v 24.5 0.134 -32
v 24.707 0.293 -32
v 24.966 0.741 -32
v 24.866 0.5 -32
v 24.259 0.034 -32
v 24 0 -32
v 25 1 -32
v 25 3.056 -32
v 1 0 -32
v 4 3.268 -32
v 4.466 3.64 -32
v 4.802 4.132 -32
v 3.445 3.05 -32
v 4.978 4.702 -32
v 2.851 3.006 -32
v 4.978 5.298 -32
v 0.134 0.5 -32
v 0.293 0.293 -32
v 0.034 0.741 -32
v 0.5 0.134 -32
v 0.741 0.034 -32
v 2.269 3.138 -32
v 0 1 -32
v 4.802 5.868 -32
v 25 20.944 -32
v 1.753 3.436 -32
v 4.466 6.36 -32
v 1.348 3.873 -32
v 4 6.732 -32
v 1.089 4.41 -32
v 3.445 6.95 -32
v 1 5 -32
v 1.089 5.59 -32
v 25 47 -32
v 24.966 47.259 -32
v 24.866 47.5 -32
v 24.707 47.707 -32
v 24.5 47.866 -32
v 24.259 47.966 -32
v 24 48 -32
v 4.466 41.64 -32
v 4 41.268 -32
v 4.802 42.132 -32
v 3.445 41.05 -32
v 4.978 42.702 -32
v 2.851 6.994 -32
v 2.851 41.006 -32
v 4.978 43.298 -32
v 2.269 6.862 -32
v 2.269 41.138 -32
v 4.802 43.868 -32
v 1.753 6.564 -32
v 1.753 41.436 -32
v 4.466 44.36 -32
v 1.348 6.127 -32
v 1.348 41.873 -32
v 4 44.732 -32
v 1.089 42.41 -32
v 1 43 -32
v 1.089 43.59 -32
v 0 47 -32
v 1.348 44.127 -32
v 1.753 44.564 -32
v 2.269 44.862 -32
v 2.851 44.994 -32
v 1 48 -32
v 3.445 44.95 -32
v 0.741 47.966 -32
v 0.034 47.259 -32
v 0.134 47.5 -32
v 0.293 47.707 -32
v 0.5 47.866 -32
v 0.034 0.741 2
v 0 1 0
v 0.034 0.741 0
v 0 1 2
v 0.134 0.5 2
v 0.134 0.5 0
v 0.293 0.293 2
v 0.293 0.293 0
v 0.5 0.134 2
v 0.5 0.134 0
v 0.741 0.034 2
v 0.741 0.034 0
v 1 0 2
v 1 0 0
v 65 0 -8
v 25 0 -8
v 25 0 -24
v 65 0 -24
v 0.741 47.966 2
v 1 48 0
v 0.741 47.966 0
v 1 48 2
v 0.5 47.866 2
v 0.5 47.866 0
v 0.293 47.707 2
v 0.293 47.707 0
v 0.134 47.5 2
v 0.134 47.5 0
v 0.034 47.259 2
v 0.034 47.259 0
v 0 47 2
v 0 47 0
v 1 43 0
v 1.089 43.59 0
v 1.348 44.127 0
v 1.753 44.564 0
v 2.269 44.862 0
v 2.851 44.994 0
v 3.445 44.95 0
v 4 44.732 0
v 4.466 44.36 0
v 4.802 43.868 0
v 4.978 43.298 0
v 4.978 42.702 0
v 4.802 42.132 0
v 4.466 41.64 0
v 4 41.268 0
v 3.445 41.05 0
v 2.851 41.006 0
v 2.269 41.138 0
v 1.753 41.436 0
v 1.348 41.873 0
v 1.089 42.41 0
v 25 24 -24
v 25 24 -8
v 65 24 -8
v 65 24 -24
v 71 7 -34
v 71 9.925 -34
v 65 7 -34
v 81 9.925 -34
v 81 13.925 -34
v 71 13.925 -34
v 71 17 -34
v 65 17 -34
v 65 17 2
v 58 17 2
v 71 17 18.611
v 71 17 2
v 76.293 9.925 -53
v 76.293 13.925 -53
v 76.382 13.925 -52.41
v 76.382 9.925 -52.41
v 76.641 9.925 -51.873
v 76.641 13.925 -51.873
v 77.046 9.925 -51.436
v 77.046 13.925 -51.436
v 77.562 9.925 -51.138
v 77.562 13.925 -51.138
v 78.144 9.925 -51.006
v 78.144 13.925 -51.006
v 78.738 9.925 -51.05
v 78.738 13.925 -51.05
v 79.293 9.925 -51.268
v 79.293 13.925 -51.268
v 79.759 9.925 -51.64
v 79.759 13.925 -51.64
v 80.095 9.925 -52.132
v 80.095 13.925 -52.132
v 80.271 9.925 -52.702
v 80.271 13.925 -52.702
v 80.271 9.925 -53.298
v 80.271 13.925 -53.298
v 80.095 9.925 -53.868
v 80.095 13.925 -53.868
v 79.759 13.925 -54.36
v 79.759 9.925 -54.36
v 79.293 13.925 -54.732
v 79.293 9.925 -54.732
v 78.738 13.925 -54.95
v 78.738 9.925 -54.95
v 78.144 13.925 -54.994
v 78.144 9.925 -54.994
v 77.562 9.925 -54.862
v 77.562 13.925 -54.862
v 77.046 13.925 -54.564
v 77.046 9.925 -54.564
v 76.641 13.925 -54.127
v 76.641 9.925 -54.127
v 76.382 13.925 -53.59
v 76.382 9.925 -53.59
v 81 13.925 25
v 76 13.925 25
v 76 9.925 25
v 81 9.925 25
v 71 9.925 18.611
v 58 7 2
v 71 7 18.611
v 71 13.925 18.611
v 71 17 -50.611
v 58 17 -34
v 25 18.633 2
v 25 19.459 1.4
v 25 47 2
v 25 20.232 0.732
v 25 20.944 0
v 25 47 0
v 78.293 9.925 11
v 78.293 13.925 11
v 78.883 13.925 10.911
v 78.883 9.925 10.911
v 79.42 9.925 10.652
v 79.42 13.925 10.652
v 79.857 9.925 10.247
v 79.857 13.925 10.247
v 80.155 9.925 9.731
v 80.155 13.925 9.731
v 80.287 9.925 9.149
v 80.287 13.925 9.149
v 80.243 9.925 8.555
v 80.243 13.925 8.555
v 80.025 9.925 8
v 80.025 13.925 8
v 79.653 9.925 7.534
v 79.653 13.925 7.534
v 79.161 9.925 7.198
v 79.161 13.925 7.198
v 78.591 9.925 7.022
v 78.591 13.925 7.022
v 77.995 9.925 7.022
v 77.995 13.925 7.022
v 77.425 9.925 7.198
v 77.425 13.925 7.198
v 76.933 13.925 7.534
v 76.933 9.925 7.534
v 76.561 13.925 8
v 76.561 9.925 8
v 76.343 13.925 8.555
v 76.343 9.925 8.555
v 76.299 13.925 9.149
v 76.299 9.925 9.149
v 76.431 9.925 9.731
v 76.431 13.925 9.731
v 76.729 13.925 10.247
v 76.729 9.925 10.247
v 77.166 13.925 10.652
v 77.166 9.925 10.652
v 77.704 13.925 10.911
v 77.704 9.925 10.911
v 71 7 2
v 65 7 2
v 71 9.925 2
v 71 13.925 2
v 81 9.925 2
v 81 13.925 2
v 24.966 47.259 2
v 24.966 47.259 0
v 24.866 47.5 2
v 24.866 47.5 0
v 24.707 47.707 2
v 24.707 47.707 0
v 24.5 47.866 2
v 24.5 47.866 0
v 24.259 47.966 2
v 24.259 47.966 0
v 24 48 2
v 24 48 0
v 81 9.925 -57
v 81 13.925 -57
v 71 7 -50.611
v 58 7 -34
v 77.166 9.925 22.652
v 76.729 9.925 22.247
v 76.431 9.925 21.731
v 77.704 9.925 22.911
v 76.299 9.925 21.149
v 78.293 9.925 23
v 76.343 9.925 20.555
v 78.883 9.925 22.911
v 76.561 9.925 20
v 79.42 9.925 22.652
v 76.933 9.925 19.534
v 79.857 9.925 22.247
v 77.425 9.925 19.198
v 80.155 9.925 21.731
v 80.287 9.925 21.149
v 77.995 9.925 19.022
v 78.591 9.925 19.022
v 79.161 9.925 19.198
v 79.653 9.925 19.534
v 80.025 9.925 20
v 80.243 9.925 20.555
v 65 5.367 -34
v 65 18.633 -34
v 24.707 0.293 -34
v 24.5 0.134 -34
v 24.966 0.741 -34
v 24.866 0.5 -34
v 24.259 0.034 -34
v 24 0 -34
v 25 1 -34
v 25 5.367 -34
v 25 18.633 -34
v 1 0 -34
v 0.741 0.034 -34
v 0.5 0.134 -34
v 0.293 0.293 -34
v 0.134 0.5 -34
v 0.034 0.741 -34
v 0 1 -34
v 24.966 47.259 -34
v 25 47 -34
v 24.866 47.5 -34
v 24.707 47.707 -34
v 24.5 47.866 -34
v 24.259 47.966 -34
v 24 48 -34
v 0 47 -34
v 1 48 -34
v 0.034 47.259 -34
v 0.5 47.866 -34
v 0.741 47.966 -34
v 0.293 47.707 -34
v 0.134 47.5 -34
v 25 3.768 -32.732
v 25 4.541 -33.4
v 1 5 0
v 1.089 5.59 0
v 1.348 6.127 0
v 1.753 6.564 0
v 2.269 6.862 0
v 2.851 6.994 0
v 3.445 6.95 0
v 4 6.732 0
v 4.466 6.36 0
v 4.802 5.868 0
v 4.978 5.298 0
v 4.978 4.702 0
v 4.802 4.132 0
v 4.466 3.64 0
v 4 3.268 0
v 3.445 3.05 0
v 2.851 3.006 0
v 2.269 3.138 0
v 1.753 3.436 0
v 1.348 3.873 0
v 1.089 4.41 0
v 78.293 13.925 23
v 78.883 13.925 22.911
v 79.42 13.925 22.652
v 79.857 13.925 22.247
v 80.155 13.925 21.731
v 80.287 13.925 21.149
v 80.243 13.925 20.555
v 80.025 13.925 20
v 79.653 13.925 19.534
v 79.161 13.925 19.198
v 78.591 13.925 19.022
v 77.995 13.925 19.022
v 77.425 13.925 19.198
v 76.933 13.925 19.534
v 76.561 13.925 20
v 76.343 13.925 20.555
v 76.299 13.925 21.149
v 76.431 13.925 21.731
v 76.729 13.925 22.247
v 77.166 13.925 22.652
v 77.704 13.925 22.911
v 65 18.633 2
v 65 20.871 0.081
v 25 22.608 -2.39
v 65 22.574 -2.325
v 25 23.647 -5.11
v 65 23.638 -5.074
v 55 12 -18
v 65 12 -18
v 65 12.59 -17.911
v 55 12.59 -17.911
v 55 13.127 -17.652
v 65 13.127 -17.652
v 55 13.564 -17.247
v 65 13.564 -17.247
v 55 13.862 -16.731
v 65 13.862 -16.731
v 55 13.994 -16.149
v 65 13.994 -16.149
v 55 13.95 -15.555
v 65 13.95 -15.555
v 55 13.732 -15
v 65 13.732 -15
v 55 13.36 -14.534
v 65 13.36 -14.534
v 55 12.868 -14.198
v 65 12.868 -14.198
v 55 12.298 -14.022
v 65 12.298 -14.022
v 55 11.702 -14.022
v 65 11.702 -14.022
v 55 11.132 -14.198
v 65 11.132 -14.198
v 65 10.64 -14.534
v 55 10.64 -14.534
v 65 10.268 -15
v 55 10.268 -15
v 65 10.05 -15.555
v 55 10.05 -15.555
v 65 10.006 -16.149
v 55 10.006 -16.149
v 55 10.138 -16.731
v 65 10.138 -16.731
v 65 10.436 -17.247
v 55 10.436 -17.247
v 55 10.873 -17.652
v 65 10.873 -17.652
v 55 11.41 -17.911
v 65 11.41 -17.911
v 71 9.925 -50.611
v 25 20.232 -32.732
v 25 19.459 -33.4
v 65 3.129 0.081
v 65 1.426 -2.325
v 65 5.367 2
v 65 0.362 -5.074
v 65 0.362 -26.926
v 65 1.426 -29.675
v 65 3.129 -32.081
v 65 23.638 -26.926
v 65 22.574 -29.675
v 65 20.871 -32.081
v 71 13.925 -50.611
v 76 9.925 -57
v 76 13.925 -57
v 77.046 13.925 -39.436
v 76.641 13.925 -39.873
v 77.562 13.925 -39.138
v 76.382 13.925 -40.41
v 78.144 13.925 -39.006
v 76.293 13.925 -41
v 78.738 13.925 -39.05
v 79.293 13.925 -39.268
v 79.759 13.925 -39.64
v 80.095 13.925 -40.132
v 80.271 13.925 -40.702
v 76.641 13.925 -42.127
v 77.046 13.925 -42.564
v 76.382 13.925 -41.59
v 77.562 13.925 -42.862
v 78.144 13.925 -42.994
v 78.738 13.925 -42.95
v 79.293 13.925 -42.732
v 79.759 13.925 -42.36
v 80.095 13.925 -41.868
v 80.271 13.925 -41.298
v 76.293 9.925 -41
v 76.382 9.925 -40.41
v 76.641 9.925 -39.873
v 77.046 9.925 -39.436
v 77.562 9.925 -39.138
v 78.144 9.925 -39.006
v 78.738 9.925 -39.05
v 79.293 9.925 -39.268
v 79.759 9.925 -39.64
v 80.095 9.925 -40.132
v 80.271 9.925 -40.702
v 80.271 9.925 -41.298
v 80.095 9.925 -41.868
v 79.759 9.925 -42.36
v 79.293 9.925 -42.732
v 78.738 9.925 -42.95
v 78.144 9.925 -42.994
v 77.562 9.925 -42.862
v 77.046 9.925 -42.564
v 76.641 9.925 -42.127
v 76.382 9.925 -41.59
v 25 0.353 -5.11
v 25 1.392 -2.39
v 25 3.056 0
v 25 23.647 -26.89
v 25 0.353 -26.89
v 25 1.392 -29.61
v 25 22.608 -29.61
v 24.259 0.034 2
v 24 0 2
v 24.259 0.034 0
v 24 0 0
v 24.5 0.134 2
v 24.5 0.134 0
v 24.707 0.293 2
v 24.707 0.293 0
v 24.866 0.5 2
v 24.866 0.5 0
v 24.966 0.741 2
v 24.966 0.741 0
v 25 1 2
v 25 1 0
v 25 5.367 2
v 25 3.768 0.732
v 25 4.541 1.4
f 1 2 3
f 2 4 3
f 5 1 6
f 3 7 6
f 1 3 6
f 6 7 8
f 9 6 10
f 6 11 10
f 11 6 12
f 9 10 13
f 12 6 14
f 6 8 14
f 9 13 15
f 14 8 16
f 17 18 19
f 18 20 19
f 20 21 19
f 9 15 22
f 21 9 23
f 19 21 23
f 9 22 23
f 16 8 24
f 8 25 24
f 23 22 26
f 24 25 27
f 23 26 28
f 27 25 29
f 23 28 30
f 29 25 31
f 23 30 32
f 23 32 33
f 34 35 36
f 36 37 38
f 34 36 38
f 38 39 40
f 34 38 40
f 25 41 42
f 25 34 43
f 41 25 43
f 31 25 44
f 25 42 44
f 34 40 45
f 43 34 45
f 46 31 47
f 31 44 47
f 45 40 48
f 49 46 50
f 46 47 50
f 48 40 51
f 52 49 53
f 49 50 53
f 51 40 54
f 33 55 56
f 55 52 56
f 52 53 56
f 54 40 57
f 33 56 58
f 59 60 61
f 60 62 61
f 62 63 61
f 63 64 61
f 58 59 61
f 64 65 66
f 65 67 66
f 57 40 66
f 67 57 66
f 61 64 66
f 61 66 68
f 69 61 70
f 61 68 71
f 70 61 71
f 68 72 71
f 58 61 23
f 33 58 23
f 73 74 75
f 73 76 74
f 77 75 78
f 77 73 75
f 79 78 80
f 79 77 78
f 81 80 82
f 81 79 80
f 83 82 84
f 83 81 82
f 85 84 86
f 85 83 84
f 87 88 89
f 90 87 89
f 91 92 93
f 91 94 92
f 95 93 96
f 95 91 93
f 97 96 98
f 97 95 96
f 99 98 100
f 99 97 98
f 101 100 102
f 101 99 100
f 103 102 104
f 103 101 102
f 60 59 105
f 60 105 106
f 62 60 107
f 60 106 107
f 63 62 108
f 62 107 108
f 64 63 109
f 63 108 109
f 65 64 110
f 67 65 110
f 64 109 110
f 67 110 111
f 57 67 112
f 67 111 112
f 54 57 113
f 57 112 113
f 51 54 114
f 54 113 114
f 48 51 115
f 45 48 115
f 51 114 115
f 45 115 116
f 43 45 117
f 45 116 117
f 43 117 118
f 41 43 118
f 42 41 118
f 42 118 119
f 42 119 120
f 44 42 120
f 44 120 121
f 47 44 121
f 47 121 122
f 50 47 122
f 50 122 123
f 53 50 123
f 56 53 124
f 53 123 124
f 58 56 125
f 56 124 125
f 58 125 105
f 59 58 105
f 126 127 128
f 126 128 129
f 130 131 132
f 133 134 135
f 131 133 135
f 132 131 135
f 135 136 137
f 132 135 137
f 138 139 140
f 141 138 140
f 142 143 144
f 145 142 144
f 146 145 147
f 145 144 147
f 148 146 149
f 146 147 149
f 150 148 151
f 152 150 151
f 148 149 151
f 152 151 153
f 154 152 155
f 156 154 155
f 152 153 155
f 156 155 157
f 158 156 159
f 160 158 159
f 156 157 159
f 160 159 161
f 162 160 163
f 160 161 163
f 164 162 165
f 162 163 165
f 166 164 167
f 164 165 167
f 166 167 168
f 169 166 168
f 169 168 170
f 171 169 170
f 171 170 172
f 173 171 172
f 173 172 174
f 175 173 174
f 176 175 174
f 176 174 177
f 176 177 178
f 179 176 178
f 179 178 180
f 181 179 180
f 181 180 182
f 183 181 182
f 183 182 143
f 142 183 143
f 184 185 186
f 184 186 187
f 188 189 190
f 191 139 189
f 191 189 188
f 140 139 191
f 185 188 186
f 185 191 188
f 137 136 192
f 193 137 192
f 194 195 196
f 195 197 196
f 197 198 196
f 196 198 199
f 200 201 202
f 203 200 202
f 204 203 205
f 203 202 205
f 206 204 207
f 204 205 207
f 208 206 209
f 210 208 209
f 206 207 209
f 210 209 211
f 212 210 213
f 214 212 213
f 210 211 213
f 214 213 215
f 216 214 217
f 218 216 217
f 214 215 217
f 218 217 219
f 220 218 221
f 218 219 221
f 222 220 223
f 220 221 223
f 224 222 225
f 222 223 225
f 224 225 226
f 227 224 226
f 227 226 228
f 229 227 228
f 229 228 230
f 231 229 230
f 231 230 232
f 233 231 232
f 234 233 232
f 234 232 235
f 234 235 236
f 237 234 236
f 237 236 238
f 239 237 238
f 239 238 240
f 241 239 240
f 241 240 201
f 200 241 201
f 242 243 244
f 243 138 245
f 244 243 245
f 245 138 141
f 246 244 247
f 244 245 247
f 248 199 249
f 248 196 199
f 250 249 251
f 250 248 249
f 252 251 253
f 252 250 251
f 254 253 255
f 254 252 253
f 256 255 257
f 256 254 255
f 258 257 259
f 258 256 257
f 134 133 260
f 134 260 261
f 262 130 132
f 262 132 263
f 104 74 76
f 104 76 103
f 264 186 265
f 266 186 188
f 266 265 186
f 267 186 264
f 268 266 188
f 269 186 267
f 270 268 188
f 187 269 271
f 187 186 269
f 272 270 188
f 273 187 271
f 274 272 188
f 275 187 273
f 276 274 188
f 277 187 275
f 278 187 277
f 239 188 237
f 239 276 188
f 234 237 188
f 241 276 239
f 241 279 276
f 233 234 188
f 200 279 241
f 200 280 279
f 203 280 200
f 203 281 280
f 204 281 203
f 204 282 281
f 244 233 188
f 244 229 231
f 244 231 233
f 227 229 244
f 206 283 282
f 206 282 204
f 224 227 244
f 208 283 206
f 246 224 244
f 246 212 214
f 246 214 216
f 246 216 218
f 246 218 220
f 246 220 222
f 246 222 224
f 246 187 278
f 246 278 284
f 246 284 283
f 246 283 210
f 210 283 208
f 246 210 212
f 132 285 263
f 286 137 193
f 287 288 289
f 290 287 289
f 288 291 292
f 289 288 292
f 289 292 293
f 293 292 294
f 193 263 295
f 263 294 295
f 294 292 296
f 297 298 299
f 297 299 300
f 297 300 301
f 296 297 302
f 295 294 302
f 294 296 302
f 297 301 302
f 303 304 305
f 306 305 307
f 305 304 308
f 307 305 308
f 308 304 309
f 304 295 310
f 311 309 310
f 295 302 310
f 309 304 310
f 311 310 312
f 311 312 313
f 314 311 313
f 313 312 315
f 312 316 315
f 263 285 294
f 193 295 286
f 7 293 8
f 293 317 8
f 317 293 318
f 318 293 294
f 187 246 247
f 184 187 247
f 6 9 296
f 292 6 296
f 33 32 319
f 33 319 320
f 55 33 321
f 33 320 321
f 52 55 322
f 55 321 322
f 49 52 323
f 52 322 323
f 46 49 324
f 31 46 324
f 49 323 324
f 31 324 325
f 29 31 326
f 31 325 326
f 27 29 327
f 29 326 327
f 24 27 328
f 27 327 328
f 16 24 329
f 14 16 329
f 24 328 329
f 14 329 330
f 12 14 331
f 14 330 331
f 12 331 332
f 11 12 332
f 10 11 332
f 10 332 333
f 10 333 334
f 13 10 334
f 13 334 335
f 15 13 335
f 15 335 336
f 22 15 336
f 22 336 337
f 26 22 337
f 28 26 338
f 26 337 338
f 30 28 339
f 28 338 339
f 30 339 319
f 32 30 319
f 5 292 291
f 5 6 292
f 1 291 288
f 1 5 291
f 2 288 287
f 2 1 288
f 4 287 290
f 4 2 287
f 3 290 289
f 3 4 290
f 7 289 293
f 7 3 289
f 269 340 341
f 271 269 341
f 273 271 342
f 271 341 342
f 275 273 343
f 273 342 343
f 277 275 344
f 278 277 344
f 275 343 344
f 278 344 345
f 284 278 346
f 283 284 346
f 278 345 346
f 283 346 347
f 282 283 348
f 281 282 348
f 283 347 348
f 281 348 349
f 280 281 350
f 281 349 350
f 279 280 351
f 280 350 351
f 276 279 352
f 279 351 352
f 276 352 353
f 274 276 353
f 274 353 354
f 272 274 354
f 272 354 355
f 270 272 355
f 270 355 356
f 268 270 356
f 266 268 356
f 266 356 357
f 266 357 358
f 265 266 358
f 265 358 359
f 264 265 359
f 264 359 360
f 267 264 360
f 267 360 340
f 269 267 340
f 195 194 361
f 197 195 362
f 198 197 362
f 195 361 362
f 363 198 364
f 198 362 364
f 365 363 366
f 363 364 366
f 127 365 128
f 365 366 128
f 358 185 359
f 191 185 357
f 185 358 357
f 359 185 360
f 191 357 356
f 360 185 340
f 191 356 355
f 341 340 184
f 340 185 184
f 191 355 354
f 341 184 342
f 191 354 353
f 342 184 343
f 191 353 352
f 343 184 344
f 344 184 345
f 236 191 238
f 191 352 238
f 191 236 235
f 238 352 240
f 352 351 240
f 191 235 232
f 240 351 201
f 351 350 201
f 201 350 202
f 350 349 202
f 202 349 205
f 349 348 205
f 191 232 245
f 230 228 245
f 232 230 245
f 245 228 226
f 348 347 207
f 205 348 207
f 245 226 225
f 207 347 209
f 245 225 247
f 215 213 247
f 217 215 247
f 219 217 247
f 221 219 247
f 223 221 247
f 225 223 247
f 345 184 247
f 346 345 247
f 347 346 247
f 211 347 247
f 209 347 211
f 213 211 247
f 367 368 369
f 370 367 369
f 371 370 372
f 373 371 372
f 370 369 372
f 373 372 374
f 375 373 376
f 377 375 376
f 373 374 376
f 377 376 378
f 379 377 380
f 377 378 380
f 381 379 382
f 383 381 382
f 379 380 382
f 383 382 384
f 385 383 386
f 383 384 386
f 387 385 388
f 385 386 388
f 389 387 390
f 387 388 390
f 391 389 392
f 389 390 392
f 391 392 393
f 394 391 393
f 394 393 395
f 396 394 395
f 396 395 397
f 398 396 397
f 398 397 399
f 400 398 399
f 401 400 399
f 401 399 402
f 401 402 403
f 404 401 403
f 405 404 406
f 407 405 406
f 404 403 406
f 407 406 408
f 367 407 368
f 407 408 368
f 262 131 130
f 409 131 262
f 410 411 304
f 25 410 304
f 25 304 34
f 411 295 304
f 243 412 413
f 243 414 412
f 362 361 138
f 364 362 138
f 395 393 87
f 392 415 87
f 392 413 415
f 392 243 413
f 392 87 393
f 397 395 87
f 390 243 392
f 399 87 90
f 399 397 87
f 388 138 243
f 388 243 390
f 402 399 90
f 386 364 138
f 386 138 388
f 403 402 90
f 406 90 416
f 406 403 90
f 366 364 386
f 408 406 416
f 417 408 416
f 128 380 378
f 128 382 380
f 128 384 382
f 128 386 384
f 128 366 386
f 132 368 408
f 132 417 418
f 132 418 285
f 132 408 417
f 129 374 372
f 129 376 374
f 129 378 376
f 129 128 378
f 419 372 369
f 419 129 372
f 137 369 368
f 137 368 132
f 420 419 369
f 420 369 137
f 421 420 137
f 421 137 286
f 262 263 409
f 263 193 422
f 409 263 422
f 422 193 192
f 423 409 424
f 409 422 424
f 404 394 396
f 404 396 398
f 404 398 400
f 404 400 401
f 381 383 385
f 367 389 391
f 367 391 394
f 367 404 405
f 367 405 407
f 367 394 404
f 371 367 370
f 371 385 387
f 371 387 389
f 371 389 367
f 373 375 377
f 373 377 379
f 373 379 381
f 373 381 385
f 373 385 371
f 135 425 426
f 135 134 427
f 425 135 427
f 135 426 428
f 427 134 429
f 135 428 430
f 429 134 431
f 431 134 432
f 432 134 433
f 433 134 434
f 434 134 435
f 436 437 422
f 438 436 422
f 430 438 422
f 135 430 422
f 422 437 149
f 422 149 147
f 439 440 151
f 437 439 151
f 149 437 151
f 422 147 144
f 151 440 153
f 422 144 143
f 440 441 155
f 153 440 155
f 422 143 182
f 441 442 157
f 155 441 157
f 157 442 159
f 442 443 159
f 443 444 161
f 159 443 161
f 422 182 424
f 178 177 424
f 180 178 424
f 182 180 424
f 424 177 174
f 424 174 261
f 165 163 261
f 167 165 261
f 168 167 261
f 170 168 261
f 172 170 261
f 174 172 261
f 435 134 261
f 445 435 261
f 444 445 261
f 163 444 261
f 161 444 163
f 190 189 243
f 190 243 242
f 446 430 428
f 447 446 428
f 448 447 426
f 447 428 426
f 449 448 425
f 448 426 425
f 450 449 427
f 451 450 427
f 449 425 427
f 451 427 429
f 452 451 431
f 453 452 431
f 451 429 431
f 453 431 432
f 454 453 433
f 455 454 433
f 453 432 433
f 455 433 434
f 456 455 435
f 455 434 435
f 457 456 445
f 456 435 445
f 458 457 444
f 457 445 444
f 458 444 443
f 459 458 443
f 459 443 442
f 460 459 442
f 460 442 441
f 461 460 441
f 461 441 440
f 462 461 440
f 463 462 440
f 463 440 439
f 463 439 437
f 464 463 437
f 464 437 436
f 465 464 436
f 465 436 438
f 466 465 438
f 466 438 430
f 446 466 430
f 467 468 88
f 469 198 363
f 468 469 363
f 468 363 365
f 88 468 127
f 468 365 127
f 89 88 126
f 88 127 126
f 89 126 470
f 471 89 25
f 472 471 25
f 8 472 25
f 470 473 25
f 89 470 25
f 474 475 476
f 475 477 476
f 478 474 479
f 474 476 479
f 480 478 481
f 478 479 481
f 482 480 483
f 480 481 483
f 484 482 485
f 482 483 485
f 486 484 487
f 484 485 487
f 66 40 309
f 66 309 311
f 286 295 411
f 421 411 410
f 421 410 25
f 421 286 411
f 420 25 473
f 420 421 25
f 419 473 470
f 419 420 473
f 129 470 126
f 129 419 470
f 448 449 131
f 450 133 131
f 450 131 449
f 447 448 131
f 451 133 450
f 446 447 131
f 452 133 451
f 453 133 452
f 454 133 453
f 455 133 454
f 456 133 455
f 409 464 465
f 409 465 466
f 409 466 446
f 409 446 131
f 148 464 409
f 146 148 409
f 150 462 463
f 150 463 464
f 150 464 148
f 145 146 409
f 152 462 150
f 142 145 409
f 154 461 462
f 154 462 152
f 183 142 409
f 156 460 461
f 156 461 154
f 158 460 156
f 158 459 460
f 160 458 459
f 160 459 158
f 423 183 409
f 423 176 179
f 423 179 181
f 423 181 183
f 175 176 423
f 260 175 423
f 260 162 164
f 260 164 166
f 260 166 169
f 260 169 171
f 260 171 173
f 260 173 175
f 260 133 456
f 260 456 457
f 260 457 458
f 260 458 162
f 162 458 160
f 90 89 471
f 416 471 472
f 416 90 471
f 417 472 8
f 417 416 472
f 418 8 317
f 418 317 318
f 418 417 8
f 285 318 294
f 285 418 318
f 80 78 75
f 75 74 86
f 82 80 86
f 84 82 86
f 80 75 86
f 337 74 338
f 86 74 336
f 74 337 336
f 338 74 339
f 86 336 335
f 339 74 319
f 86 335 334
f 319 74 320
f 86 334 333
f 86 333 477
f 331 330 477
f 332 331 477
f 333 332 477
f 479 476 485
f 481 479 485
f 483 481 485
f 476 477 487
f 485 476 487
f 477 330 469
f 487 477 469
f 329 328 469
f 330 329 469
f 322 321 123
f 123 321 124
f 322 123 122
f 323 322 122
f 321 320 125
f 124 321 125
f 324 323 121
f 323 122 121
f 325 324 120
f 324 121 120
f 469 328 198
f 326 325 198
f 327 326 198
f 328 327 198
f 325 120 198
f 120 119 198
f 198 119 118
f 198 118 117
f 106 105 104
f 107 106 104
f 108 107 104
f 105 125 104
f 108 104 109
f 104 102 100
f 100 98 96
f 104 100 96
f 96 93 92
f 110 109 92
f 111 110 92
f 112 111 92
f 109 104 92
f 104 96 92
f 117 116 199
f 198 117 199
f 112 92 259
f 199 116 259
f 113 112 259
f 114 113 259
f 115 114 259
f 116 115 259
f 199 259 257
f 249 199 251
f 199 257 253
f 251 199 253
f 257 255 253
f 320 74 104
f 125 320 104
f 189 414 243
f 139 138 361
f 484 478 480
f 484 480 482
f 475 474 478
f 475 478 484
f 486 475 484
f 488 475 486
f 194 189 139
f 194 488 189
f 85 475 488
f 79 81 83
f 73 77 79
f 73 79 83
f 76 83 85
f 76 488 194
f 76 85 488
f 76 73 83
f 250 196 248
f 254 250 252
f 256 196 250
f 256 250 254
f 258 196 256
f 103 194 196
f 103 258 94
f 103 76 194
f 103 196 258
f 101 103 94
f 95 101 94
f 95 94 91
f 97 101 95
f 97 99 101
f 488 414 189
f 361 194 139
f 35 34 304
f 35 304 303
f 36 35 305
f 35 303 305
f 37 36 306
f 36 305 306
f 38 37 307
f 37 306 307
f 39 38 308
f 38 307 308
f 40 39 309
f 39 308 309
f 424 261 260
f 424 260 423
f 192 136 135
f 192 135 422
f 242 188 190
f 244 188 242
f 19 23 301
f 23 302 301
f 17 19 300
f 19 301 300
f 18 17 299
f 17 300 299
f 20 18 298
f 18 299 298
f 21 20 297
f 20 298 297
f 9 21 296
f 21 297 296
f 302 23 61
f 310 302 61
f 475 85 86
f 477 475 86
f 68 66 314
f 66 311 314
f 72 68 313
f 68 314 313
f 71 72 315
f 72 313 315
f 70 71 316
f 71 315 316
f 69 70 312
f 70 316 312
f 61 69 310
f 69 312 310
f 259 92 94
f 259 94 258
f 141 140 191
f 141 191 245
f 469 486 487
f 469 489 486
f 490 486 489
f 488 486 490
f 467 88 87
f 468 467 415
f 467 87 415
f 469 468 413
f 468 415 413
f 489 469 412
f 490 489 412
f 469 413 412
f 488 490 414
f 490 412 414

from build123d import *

# Parameters (mm, degrees)
ESQUISSE1_W             = 25
ESQUISSE1_H             = 48
BOSS_EXTRU_1_DEPTH      = 2
ESQUISSE2_R             = 2
BOSS_EXTRU_2_DEPTH      = 32
ESQUISSE3_W             = 25
ESQUISSE3_H             = 48
BOSS_EXTRU_3_DEPTH      = 2
ESQUISSE5_W             = 36
ESQUISSE5_H             = 24
BOSS_EXTRU_4_DEPTH      = 40
ESQUISSE6_R             = 2
ENL_V_MAT_EXTRU_1_DEPTH = 10
ENL_V_MAT_EXTRU_2_DEPTH = 40
ESQUISSE9_W             = 23
ESQUISSE9_H             = 10
BOSS_EXTRU_5_DEPTH      = 23
ESQUISSE10_R            = 2
ENL_V_MAT_EXTRU_3_DEPTH = 23
ESQUISSE11_W            = 23
ESQUISSE11_H            = 10
BOSS_EXTRU_6_DEPTH      = 23
ESQUISSE13_R            = 2
ENL_V_MAT_EXTRU_4_DEPTH = 23
ENL_V_MAT_EXTRU_5_DEPTH = 23
ESQUISSE15_W            = 82
ESQUISSE15_H            = 3.074752109
ESQUISSE15_H_2          = 2.925247891
ENL_V_MAT_EXTRU_6_DEPTH = 10
CONG_1_R                = 1
CONG_2_R                = 1


with BuildPart() as part:
    # Esquisse1 → Boss.-Extru.1 (new body)
    with BuildSketch(Plane.XY):
        with Locations((12.5, 24)):
            Rectangle(ESQUISSE1_W, ESQUISSE1_H)
    extrude(amount=BOSS_EXTRU_1_DEPTH)

    # Esquisse2 → Boss.-Extru.2 (add)
    with BuildSketch(Plane(origin=(0, 0, 0), x_dir=(-1, 0, 0), z_dir=(0, 0, -1))):
        with Locations((-3, 5)):
            Circle(ESQUISSE2_R)
        with Locations((-3, 43)):
            Circle(ESQUISSE2_R)
    extrude(amount=BOSS_EXTRU_2_DEPTH)

    # Esquisse3 → Boss.-Extru.3 (add)
    with BuildSketch(Plane(origin=(0, 0, -32), x_dir=(-1, 0, 0), z_dir=(0, 0, -1))):
        with Locations((-12.5, 24)):
            Rectangle(ESQUISSE3_W, ESQUISSE3_H)
    extrude(amount=BOSS_EXTRU_3_DEPTH)

    # Esquisse5 → Boss.-Extru.4 (add)
    with BuildSketch(Plane(origin=(25, 0, 0), x_dir=(0, 0, -1), z_dir=(1, 0, 0))):
        with Locations((16, 12)):
            Rectangle(ESQUISSE5_W, ESQUISSE5_H)
    extrude(amount=BOSS_EXTRU_4_DEPTH)

    # Esquisse6 → Enlèv. mat.-Extru.1 (cut)
    with BuildSketch(Plane(origin=(65, 0, 0), x_dir=(0, 0, -1), z_dir=(1, 0, 0))):
        with Locations((16, 12)):
            Circle(ESQUISSE6_R)
    extrude(amount=-ENL_V_MAT_EXTRU_1_DEPTH, mode=Mode.SUBTRACT)

    # Esquisse7 → Enlèv. mat.-Extru.2 (cut)
    with BuildSketch(Plane(origin=(65, 0, 0), x_dir=(0, 0, -1), z_dir=(1, 0, 0))):
        with BuildLine():
            Line((8, 24), (8, 33.499215261))
            Line((8, 33.499215261), (-16.874865577, 33.499215261))
            Line((-16.874865577, 33.499215261), (-16.874865577, 0))
            Line((-16.874865577, 0), (8, 0))
            ThreePointArc((8, 0), (-4, 12), (8, 24))
        make_face()
        with BuildLine():
            Line((24, 24), (24, 33.499215261))
            Line((24, 33.499215261), (42.8283548, 33.499215261))
            Line((42.8283548, 33.499215261), (42.8283548, 0))
            Line((42.8283548, 0), (24, 0))
            ThreePointArc((24, 0), (36, 12), (24, 24))
        make_face()
    extrude(amount=-ENL_V_MAT_EXTRU_2_DEPTH, mode=Mode.SUBTRACT)

    # Esquisse9 → Boss.-Extru.5 (add)
    with BuildSketch(Plane.XY.offset(2)):
        with Locations((69.5, 12)):
            Rectangle(ESQUISSE9_W, ESQUISSE9_H)
    extrude(amount=BOSS_EXTRU_5_DEPTH)

    # Esquisse10 → Enlèv. mat.-Extru.3 (cut)
    with BuildSketch(Plane(origin=(0, 17, 0), x_dir=(1, 0, 0), z_dir=(0, 1, 0))):
        with Locations(Location((78.293015344, -21, 0), (0, 0, 270))):
            Circle(ESQUISSE10_R)
        with Locations(Location((78.293015344, -9, 0), (0, 0, 270))):
            Circle(ESQUISSE10_R)
    extrude(amount=-ENL_V_MAT_EXTRU_3_DEPTH, mode=Mode.SUBTRACT)

    # Esquisse11 → Boss.-Extru.6 (add)
    with BuildSketch(Plane(origin=(0, 0, -34), x_dir=(-1, 0, 0), z_dir=(0, 0, -1))):
        with Locations((-69.5, 12)):
            Rectangle(ESQUISSE11_W, ESQUISSE11_H)
    extrude(amount=BOSS_EXTRU_6_DEPTH)

    # Esquisse13 → Enlèv. mat.-Extru.4 (cut)
    with BuildSketch(Plane(origin=(0, 17, 0), x_dir=(1, 0, 0), z_dir=(0, 1, 0))):
        with Locations(Location((78.293015344, 41, 0), (0, 0, 180))):
            Circle(ESQUISSE13_R)
        with Locations(Location((78.293015344, 53, 0), (0, 0, 180))):
            Circle(ESQUISSE13_R)
    extrude(amount=-ENL_V_MAT_EXTRU_4_DEPTH, mode=Mode.SUBTRACT)

    # Esquisse14 → Enlèv. mat.-Extru.5 (cut)
    with BuildSketch(Plane(origin=(0, 17, 0), x_dir=(1, 0, 0), z_dir=(0, 1, 0))):
        Polygon((58, 34), (76, 57), (58, 57), align=None)
        Polygon((58, -2), (76, -25), (58, -25), align=None)
    extrude(amount=-ENL_V_MAT_EXTRU_5_DEPTH, mode=Mode.SUBTRACT)

    # Esquisse15 → Enlèv. mat.-Extru.6 (cut)
    with BuildSketch(Plane(origin=(81, 0, 0), x_dir=(0, 0, -1), z_dir=(1, 0, 0))):
        with Locations((16, 15.462623946)):
            Rectangle(ESQUISSE15_W, ESQUISSE15_H)
        with Locations((16, 8.462623946)):
            Rectangle(ESQUISSE15_W, ESQUISSE15_H_2)
    extrude(amount=-ENL_V_MAT_EXTRU_6_DEPTH, mode=Mode.SUBTRACT)

    # Congé1
    cong_1_edges = [part.edges().sort_by_distance(p)[0] for p in [
        (25, 0, 1),
        (0, 48, 1),
        (25, 48, 1),
        (0, 0, 1),
    ]]
    fillet(cong_1_edges, radius=CONG_1_R)

    # Congé2
    cong_2_edges = [part.edges().sort_by_distance(p)[0] for p in [
        (0, 0, -33),
        (0, 48, -33),
        (25, 48, -33),
        (25, 0, -33),
    ]]
    fillet(cong_2_edges, radius=CONG_2_R)


solid = part.part
